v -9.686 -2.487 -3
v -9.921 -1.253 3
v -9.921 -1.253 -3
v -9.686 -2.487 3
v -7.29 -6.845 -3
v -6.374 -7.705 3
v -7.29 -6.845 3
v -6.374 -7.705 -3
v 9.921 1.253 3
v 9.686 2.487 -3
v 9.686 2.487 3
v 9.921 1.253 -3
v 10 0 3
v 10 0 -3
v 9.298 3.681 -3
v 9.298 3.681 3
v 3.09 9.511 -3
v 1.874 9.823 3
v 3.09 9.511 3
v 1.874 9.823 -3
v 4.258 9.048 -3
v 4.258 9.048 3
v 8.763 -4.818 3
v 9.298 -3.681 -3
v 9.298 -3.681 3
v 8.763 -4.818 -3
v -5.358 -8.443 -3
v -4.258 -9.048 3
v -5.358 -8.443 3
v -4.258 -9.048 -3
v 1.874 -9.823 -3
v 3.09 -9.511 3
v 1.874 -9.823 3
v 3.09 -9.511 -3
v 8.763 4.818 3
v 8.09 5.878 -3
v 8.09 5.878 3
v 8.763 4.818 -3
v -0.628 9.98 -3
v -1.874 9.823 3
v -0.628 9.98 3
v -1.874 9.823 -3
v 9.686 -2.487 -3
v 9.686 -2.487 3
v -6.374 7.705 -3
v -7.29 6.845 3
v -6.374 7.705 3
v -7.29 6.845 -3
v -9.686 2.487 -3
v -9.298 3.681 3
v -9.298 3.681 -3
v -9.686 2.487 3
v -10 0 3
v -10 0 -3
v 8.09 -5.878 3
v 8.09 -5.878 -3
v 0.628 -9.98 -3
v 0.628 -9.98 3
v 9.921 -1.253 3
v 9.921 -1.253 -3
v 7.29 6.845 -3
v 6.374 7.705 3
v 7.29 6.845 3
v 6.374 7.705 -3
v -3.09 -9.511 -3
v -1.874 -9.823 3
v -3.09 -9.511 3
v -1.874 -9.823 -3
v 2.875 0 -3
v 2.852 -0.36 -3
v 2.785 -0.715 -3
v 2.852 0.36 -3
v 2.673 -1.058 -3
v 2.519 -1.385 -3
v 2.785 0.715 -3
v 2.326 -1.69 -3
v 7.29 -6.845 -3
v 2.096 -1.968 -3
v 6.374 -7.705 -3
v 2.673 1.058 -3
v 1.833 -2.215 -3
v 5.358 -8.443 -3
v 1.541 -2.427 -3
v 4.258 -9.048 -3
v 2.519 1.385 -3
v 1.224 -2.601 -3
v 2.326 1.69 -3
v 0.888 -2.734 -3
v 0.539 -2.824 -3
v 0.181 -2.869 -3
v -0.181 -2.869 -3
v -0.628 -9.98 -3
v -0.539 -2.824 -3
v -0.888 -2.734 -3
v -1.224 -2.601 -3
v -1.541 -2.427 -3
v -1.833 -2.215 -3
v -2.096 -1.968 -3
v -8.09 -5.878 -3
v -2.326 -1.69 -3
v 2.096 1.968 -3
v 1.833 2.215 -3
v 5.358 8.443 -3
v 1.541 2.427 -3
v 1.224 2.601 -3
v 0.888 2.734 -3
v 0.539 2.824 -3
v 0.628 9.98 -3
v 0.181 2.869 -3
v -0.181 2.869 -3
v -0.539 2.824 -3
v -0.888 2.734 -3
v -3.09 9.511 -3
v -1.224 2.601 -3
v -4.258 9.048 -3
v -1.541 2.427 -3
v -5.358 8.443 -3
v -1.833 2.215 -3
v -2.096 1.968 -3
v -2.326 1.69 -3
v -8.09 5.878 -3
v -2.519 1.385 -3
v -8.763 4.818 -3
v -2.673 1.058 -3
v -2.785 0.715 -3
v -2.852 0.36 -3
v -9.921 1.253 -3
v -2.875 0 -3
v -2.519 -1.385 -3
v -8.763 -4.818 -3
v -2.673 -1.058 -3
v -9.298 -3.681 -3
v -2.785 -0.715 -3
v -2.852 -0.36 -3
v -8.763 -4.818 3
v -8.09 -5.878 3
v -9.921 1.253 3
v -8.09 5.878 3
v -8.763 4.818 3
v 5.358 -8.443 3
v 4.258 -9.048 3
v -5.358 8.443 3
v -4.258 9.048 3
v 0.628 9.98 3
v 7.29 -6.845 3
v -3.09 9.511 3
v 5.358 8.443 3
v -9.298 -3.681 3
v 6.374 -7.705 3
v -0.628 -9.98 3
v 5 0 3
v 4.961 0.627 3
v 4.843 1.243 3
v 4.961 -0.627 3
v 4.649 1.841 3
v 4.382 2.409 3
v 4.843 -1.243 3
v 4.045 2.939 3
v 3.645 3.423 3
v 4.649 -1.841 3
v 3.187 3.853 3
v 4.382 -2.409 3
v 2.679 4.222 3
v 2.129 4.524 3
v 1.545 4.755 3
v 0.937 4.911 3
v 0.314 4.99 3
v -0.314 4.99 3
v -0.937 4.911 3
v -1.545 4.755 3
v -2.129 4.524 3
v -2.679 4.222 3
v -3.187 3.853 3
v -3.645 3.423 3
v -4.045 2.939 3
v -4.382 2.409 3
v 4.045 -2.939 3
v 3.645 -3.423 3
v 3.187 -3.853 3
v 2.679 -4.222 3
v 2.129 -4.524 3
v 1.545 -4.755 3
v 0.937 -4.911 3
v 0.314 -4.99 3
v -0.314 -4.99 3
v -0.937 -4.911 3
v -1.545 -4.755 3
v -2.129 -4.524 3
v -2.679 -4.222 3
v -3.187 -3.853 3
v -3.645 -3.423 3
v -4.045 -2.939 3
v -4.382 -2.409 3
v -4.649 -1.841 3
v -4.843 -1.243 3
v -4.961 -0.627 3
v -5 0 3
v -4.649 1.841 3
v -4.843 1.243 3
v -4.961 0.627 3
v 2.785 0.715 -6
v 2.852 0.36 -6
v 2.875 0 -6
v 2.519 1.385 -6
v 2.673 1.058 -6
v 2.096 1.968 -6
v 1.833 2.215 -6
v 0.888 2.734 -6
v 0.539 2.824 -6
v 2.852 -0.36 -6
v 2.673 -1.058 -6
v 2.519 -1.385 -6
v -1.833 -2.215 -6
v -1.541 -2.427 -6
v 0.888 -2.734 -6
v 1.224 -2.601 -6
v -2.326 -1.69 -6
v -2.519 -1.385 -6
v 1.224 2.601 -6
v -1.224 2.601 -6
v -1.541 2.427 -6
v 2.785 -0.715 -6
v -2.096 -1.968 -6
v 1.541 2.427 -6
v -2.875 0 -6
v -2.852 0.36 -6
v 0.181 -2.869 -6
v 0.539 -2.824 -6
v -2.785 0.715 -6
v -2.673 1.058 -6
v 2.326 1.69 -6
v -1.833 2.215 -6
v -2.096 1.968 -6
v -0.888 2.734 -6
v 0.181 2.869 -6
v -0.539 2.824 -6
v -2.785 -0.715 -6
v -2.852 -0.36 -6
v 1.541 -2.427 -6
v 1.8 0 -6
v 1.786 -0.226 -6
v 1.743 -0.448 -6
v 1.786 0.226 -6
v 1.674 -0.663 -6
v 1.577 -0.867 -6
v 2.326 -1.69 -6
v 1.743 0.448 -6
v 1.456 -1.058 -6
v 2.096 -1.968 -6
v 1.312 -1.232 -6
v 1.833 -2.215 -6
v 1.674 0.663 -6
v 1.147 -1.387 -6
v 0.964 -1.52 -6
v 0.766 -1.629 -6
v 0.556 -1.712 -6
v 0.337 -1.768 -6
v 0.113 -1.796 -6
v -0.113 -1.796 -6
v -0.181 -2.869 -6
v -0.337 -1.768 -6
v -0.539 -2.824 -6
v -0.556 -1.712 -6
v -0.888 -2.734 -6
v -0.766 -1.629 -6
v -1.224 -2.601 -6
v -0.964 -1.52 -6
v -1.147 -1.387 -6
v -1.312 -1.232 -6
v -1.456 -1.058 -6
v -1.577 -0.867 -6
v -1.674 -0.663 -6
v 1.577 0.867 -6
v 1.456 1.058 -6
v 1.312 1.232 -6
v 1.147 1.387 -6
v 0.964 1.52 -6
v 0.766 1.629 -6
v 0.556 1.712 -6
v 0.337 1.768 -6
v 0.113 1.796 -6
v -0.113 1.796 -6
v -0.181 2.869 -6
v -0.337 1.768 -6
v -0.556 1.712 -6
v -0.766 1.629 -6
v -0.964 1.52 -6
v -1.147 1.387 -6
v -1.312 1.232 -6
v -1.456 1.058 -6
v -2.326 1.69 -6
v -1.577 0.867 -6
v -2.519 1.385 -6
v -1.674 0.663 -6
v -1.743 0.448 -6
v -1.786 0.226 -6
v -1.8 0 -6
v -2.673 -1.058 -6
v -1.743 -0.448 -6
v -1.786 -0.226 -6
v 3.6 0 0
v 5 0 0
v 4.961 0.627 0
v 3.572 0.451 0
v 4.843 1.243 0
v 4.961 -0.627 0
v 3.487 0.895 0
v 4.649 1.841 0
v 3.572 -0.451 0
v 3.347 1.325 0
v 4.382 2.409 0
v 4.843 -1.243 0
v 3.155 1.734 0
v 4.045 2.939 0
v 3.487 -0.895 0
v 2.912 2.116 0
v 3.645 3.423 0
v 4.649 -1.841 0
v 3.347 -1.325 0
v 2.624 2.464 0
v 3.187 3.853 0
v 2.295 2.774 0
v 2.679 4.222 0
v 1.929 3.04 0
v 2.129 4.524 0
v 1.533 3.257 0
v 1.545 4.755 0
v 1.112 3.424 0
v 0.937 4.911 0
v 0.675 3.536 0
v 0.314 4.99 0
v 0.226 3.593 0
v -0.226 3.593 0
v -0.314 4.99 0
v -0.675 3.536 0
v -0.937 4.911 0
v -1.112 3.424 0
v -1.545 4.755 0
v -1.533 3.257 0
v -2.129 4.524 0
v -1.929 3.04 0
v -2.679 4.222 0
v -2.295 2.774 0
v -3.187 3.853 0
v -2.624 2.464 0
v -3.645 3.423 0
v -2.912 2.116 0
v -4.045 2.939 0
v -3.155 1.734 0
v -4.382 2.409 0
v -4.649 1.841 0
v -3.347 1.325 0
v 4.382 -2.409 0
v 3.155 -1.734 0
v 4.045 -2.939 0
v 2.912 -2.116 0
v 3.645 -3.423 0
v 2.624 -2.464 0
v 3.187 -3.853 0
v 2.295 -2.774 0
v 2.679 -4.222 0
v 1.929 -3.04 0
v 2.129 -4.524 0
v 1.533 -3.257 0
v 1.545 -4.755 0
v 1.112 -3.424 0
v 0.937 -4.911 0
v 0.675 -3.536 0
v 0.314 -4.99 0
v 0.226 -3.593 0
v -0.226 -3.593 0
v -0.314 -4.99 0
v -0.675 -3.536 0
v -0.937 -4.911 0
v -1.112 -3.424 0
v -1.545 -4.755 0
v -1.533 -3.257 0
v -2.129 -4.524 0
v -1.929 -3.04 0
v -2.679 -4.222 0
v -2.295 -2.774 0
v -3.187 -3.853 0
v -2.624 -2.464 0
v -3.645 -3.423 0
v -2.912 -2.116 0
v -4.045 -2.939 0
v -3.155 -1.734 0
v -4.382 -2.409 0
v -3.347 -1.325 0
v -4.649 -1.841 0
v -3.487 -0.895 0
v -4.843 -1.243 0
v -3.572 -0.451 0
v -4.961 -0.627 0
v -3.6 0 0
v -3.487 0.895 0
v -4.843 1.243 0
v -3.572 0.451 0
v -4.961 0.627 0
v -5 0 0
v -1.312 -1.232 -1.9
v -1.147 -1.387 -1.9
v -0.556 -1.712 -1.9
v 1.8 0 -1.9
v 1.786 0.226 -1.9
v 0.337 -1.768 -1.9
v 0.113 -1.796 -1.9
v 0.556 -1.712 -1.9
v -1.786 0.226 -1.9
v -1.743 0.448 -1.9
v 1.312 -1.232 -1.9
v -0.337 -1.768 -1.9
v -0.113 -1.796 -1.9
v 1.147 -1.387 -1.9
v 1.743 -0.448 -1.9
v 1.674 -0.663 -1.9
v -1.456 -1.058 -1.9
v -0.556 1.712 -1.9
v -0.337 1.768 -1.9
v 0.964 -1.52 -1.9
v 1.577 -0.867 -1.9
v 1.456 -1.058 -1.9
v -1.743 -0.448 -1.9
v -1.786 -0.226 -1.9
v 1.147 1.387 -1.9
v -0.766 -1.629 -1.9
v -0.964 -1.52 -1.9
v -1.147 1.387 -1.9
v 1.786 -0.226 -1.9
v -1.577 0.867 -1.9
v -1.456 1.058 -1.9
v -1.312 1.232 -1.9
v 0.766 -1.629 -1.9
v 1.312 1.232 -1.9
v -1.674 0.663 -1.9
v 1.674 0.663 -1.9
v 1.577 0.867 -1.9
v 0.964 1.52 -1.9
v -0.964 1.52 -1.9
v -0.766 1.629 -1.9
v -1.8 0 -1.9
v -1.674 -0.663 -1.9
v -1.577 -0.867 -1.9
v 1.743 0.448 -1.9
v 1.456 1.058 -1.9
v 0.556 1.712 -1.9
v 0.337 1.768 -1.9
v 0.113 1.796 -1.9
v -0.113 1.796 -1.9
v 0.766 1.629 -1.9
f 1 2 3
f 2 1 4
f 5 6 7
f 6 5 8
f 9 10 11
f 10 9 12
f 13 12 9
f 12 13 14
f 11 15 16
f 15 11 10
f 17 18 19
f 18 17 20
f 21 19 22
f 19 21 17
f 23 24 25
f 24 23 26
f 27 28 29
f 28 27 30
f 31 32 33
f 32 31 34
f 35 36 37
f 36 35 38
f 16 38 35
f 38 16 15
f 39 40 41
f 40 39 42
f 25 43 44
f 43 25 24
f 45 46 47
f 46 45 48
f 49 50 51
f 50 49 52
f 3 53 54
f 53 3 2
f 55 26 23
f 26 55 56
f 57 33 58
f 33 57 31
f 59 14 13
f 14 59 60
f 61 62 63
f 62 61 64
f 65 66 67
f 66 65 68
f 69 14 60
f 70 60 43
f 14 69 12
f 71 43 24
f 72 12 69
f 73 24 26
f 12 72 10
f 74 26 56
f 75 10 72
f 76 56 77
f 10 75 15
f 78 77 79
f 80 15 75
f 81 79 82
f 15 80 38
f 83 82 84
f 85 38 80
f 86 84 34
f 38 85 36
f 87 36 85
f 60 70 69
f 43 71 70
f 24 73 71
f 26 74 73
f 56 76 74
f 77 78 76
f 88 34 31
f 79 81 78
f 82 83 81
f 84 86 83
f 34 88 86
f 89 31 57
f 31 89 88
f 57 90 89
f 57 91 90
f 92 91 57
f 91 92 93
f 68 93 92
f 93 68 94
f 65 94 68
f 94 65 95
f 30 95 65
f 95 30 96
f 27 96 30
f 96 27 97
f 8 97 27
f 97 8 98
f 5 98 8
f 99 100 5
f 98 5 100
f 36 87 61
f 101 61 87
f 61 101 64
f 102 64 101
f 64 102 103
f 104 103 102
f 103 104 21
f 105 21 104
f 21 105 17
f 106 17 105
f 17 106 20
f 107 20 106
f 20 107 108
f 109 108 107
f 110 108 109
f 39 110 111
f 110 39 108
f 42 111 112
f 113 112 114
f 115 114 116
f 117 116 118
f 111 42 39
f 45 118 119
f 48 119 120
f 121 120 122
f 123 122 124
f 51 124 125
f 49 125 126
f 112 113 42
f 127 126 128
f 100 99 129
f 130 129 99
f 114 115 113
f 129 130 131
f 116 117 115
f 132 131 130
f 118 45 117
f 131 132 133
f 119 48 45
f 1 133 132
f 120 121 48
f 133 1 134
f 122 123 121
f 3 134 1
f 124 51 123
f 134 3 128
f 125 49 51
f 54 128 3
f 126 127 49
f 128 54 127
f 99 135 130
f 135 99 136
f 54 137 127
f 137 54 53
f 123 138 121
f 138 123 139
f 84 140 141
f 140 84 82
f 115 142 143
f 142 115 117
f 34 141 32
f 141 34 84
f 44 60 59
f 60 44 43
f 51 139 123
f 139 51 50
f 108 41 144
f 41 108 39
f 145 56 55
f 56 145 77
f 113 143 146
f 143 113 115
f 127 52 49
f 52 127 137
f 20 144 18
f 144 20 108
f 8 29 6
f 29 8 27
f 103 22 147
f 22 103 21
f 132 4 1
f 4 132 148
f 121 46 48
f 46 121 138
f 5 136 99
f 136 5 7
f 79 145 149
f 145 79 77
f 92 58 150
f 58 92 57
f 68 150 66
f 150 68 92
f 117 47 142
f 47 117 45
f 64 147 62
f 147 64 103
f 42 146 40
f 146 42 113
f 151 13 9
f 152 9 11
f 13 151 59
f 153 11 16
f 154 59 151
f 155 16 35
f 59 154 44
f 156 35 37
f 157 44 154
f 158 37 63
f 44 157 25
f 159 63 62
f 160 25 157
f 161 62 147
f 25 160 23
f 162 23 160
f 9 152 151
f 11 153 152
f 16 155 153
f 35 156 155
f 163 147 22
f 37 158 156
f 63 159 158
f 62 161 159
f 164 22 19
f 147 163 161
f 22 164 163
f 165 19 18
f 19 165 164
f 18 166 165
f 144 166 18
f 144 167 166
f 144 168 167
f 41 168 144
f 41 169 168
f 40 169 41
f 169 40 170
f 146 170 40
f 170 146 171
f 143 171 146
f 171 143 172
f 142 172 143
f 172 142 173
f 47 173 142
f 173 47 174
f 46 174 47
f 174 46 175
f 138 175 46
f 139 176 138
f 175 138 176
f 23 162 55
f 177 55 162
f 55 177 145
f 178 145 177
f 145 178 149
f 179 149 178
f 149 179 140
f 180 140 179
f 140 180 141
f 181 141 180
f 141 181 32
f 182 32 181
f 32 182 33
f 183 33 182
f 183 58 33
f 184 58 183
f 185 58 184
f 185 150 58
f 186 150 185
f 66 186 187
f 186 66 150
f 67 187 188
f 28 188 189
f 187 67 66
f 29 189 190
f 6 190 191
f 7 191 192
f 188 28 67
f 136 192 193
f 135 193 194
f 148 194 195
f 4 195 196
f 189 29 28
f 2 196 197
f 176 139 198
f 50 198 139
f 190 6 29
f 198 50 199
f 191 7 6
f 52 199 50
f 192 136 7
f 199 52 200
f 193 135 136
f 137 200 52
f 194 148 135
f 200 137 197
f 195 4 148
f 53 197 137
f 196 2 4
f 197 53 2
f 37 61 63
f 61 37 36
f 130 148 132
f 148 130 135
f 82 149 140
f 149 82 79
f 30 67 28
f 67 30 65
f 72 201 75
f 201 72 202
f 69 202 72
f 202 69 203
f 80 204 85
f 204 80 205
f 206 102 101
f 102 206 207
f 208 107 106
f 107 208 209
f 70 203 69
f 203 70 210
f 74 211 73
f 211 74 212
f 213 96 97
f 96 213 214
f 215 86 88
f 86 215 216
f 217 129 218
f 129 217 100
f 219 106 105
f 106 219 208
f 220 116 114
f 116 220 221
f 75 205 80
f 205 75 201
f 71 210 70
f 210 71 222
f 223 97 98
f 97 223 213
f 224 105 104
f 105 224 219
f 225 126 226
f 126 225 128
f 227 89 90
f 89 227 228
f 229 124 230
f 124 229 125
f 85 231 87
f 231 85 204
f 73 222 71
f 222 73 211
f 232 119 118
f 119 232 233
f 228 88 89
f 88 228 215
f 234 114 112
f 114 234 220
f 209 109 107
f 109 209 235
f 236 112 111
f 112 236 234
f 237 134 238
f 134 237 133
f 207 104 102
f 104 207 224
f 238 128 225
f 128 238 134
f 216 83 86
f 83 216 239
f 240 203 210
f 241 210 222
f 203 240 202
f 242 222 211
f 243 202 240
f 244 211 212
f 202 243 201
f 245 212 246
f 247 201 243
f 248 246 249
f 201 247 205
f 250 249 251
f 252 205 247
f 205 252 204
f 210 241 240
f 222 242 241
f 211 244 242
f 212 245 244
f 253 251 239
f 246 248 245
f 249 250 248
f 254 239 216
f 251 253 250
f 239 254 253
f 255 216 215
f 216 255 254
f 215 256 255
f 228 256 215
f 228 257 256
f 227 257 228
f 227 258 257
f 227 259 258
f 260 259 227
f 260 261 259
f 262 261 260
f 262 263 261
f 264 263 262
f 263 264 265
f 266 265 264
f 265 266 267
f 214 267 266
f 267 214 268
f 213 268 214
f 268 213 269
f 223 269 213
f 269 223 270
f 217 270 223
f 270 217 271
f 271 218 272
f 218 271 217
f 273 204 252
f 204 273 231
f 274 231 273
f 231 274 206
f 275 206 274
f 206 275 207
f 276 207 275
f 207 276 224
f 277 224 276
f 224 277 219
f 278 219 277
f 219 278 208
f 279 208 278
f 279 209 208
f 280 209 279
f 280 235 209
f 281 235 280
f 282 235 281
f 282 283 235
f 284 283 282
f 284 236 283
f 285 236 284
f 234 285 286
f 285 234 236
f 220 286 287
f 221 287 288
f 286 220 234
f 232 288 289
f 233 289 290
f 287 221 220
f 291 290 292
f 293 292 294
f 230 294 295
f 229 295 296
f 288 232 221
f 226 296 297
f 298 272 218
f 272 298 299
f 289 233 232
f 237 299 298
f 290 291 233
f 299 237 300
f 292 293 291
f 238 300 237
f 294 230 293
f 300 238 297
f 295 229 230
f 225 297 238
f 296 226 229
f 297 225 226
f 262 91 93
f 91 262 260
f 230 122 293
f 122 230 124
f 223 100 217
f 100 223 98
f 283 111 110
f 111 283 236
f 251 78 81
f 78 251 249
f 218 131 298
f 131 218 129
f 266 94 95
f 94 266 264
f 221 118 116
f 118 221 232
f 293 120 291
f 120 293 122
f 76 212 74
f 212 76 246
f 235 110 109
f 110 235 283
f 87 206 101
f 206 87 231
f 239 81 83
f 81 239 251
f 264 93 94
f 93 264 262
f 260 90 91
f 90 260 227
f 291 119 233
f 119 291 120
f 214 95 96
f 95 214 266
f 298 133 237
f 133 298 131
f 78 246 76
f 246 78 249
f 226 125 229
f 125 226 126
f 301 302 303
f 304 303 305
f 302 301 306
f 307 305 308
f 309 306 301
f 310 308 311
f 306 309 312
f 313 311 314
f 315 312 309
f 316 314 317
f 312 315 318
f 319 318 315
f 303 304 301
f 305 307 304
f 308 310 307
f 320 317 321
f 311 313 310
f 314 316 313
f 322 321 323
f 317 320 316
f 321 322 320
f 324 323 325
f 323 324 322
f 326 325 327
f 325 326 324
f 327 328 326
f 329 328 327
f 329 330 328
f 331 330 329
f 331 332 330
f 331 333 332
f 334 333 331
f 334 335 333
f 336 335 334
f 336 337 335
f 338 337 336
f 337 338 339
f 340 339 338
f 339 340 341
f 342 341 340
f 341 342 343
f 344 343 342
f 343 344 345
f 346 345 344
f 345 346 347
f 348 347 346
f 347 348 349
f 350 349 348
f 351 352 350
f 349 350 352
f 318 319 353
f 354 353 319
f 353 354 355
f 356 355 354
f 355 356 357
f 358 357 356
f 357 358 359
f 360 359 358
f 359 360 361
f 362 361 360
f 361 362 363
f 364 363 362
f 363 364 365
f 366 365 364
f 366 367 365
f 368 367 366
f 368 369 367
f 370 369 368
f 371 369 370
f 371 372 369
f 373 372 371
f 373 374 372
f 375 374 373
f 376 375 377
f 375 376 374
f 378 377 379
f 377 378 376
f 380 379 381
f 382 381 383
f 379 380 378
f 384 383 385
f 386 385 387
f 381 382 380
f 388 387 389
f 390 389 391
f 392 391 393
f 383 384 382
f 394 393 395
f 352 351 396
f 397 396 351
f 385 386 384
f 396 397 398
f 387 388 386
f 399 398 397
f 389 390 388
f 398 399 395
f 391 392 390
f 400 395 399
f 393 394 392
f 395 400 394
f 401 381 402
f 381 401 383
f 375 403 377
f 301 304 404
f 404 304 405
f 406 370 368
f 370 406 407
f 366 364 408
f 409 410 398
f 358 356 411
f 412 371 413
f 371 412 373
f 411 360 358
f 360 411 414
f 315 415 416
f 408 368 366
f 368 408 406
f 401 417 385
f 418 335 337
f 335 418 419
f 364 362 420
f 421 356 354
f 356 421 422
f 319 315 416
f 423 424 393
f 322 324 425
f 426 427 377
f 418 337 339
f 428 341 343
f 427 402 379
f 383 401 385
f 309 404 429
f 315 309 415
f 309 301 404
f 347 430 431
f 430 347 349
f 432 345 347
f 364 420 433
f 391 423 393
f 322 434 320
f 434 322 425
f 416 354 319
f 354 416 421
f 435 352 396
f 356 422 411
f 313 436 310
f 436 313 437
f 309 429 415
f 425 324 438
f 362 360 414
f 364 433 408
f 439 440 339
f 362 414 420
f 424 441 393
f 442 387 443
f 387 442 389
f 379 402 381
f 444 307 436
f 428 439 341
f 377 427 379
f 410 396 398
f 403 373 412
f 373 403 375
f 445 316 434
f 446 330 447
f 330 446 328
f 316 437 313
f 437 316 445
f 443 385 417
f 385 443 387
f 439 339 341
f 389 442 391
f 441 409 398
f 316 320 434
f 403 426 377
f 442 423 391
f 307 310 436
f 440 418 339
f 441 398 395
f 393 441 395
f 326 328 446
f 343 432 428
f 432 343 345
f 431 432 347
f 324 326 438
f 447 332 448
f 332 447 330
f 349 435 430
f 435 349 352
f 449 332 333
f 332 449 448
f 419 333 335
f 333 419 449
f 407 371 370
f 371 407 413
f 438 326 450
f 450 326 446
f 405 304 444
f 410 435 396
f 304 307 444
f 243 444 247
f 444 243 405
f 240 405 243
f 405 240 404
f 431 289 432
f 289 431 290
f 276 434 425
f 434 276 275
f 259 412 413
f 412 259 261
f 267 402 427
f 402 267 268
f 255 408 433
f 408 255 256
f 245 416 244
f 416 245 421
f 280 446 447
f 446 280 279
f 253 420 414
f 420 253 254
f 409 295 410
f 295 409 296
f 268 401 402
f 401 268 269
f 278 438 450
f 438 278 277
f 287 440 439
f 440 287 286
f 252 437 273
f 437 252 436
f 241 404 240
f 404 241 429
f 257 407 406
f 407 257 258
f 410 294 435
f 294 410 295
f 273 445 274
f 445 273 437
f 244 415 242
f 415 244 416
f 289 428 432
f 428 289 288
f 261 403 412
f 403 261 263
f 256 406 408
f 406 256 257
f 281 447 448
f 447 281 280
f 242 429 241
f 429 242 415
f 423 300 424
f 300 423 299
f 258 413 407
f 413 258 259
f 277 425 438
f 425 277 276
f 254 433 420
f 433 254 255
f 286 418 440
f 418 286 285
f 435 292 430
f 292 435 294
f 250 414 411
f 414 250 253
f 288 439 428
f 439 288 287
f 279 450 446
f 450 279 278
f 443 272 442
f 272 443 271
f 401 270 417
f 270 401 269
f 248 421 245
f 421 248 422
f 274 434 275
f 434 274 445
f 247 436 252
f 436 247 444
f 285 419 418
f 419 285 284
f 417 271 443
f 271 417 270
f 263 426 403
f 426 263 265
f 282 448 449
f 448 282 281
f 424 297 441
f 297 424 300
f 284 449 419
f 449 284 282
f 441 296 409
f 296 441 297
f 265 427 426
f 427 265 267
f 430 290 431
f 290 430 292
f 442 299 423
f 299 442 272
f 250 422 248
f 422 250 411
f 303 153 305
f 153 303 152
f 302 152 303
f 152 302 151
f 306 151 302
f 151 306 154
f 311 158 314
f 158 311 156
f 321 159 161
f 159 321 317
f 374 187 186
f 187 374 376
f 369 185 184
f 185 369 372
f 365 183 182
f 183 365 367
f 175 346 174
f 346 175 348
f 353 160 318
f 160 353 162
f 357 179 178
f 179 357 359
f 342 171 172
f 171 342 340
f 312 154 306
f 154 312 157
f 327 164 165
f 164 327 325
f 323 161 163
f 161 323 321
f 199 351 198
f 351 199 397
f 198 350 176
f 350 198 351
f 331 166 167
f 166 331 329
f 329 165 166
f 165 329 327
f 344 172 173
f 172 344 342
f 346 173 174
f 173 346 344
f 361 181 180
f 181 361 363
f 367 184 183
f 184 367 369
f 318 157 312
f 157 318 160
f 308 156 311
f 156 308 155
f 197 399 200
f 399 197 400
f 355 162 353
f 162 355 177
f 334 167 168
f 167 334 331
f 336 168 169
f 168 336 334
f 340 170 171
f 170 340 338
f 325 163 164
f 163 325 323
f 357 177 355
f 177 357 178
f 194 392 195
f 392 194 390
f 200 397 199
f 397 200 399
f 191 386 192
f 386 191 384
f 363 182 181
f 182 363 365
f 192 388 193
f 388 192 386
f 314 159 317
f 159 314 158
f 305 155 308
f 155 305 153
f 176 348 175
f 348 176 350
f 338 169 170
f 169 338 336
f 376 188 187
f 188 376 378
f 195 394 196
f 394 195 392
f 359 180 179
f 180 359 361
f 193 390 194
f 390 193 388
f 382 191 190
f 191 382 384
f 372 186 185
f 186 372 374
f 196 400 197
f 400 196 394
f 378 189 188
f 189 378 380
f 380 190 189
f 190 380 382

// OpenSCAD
$fn = 50;

difference() {
	union() {
		translate(v = [0, 0, -3.0]) {
			cylinder(h = 6, r = 10.0);
		}
		#translate(v = [0, 0, -6.0]) {
			cylinder(h = 6, r = 2.875);
		}
	}
	union() {
		translate(v = [0, 0, 0]) {
			rotate(a = [0, 0, 0]) {
				difference() {
					union() {
						translate(v = [0, 0, -6.0]) {
							cylinder(h = 6, r = 1.5);
						}
						translate(v = [0, 0, -1.9]) {
							cylinder(h = 1.9, r1 = 1.8, r2 = 3.6);
						}
						translate(v = [0, 0, -6.0]) {
							cylinder(h = 6, r = 1.8);
						}
						translate(v = [0, 0, -6.0]) {
							cylinder(h = 6, r = 1.5);
						}
					}
					union();
				}
			}
		}
		#cylinder(h = 3, r = 5.0);
	}
}
